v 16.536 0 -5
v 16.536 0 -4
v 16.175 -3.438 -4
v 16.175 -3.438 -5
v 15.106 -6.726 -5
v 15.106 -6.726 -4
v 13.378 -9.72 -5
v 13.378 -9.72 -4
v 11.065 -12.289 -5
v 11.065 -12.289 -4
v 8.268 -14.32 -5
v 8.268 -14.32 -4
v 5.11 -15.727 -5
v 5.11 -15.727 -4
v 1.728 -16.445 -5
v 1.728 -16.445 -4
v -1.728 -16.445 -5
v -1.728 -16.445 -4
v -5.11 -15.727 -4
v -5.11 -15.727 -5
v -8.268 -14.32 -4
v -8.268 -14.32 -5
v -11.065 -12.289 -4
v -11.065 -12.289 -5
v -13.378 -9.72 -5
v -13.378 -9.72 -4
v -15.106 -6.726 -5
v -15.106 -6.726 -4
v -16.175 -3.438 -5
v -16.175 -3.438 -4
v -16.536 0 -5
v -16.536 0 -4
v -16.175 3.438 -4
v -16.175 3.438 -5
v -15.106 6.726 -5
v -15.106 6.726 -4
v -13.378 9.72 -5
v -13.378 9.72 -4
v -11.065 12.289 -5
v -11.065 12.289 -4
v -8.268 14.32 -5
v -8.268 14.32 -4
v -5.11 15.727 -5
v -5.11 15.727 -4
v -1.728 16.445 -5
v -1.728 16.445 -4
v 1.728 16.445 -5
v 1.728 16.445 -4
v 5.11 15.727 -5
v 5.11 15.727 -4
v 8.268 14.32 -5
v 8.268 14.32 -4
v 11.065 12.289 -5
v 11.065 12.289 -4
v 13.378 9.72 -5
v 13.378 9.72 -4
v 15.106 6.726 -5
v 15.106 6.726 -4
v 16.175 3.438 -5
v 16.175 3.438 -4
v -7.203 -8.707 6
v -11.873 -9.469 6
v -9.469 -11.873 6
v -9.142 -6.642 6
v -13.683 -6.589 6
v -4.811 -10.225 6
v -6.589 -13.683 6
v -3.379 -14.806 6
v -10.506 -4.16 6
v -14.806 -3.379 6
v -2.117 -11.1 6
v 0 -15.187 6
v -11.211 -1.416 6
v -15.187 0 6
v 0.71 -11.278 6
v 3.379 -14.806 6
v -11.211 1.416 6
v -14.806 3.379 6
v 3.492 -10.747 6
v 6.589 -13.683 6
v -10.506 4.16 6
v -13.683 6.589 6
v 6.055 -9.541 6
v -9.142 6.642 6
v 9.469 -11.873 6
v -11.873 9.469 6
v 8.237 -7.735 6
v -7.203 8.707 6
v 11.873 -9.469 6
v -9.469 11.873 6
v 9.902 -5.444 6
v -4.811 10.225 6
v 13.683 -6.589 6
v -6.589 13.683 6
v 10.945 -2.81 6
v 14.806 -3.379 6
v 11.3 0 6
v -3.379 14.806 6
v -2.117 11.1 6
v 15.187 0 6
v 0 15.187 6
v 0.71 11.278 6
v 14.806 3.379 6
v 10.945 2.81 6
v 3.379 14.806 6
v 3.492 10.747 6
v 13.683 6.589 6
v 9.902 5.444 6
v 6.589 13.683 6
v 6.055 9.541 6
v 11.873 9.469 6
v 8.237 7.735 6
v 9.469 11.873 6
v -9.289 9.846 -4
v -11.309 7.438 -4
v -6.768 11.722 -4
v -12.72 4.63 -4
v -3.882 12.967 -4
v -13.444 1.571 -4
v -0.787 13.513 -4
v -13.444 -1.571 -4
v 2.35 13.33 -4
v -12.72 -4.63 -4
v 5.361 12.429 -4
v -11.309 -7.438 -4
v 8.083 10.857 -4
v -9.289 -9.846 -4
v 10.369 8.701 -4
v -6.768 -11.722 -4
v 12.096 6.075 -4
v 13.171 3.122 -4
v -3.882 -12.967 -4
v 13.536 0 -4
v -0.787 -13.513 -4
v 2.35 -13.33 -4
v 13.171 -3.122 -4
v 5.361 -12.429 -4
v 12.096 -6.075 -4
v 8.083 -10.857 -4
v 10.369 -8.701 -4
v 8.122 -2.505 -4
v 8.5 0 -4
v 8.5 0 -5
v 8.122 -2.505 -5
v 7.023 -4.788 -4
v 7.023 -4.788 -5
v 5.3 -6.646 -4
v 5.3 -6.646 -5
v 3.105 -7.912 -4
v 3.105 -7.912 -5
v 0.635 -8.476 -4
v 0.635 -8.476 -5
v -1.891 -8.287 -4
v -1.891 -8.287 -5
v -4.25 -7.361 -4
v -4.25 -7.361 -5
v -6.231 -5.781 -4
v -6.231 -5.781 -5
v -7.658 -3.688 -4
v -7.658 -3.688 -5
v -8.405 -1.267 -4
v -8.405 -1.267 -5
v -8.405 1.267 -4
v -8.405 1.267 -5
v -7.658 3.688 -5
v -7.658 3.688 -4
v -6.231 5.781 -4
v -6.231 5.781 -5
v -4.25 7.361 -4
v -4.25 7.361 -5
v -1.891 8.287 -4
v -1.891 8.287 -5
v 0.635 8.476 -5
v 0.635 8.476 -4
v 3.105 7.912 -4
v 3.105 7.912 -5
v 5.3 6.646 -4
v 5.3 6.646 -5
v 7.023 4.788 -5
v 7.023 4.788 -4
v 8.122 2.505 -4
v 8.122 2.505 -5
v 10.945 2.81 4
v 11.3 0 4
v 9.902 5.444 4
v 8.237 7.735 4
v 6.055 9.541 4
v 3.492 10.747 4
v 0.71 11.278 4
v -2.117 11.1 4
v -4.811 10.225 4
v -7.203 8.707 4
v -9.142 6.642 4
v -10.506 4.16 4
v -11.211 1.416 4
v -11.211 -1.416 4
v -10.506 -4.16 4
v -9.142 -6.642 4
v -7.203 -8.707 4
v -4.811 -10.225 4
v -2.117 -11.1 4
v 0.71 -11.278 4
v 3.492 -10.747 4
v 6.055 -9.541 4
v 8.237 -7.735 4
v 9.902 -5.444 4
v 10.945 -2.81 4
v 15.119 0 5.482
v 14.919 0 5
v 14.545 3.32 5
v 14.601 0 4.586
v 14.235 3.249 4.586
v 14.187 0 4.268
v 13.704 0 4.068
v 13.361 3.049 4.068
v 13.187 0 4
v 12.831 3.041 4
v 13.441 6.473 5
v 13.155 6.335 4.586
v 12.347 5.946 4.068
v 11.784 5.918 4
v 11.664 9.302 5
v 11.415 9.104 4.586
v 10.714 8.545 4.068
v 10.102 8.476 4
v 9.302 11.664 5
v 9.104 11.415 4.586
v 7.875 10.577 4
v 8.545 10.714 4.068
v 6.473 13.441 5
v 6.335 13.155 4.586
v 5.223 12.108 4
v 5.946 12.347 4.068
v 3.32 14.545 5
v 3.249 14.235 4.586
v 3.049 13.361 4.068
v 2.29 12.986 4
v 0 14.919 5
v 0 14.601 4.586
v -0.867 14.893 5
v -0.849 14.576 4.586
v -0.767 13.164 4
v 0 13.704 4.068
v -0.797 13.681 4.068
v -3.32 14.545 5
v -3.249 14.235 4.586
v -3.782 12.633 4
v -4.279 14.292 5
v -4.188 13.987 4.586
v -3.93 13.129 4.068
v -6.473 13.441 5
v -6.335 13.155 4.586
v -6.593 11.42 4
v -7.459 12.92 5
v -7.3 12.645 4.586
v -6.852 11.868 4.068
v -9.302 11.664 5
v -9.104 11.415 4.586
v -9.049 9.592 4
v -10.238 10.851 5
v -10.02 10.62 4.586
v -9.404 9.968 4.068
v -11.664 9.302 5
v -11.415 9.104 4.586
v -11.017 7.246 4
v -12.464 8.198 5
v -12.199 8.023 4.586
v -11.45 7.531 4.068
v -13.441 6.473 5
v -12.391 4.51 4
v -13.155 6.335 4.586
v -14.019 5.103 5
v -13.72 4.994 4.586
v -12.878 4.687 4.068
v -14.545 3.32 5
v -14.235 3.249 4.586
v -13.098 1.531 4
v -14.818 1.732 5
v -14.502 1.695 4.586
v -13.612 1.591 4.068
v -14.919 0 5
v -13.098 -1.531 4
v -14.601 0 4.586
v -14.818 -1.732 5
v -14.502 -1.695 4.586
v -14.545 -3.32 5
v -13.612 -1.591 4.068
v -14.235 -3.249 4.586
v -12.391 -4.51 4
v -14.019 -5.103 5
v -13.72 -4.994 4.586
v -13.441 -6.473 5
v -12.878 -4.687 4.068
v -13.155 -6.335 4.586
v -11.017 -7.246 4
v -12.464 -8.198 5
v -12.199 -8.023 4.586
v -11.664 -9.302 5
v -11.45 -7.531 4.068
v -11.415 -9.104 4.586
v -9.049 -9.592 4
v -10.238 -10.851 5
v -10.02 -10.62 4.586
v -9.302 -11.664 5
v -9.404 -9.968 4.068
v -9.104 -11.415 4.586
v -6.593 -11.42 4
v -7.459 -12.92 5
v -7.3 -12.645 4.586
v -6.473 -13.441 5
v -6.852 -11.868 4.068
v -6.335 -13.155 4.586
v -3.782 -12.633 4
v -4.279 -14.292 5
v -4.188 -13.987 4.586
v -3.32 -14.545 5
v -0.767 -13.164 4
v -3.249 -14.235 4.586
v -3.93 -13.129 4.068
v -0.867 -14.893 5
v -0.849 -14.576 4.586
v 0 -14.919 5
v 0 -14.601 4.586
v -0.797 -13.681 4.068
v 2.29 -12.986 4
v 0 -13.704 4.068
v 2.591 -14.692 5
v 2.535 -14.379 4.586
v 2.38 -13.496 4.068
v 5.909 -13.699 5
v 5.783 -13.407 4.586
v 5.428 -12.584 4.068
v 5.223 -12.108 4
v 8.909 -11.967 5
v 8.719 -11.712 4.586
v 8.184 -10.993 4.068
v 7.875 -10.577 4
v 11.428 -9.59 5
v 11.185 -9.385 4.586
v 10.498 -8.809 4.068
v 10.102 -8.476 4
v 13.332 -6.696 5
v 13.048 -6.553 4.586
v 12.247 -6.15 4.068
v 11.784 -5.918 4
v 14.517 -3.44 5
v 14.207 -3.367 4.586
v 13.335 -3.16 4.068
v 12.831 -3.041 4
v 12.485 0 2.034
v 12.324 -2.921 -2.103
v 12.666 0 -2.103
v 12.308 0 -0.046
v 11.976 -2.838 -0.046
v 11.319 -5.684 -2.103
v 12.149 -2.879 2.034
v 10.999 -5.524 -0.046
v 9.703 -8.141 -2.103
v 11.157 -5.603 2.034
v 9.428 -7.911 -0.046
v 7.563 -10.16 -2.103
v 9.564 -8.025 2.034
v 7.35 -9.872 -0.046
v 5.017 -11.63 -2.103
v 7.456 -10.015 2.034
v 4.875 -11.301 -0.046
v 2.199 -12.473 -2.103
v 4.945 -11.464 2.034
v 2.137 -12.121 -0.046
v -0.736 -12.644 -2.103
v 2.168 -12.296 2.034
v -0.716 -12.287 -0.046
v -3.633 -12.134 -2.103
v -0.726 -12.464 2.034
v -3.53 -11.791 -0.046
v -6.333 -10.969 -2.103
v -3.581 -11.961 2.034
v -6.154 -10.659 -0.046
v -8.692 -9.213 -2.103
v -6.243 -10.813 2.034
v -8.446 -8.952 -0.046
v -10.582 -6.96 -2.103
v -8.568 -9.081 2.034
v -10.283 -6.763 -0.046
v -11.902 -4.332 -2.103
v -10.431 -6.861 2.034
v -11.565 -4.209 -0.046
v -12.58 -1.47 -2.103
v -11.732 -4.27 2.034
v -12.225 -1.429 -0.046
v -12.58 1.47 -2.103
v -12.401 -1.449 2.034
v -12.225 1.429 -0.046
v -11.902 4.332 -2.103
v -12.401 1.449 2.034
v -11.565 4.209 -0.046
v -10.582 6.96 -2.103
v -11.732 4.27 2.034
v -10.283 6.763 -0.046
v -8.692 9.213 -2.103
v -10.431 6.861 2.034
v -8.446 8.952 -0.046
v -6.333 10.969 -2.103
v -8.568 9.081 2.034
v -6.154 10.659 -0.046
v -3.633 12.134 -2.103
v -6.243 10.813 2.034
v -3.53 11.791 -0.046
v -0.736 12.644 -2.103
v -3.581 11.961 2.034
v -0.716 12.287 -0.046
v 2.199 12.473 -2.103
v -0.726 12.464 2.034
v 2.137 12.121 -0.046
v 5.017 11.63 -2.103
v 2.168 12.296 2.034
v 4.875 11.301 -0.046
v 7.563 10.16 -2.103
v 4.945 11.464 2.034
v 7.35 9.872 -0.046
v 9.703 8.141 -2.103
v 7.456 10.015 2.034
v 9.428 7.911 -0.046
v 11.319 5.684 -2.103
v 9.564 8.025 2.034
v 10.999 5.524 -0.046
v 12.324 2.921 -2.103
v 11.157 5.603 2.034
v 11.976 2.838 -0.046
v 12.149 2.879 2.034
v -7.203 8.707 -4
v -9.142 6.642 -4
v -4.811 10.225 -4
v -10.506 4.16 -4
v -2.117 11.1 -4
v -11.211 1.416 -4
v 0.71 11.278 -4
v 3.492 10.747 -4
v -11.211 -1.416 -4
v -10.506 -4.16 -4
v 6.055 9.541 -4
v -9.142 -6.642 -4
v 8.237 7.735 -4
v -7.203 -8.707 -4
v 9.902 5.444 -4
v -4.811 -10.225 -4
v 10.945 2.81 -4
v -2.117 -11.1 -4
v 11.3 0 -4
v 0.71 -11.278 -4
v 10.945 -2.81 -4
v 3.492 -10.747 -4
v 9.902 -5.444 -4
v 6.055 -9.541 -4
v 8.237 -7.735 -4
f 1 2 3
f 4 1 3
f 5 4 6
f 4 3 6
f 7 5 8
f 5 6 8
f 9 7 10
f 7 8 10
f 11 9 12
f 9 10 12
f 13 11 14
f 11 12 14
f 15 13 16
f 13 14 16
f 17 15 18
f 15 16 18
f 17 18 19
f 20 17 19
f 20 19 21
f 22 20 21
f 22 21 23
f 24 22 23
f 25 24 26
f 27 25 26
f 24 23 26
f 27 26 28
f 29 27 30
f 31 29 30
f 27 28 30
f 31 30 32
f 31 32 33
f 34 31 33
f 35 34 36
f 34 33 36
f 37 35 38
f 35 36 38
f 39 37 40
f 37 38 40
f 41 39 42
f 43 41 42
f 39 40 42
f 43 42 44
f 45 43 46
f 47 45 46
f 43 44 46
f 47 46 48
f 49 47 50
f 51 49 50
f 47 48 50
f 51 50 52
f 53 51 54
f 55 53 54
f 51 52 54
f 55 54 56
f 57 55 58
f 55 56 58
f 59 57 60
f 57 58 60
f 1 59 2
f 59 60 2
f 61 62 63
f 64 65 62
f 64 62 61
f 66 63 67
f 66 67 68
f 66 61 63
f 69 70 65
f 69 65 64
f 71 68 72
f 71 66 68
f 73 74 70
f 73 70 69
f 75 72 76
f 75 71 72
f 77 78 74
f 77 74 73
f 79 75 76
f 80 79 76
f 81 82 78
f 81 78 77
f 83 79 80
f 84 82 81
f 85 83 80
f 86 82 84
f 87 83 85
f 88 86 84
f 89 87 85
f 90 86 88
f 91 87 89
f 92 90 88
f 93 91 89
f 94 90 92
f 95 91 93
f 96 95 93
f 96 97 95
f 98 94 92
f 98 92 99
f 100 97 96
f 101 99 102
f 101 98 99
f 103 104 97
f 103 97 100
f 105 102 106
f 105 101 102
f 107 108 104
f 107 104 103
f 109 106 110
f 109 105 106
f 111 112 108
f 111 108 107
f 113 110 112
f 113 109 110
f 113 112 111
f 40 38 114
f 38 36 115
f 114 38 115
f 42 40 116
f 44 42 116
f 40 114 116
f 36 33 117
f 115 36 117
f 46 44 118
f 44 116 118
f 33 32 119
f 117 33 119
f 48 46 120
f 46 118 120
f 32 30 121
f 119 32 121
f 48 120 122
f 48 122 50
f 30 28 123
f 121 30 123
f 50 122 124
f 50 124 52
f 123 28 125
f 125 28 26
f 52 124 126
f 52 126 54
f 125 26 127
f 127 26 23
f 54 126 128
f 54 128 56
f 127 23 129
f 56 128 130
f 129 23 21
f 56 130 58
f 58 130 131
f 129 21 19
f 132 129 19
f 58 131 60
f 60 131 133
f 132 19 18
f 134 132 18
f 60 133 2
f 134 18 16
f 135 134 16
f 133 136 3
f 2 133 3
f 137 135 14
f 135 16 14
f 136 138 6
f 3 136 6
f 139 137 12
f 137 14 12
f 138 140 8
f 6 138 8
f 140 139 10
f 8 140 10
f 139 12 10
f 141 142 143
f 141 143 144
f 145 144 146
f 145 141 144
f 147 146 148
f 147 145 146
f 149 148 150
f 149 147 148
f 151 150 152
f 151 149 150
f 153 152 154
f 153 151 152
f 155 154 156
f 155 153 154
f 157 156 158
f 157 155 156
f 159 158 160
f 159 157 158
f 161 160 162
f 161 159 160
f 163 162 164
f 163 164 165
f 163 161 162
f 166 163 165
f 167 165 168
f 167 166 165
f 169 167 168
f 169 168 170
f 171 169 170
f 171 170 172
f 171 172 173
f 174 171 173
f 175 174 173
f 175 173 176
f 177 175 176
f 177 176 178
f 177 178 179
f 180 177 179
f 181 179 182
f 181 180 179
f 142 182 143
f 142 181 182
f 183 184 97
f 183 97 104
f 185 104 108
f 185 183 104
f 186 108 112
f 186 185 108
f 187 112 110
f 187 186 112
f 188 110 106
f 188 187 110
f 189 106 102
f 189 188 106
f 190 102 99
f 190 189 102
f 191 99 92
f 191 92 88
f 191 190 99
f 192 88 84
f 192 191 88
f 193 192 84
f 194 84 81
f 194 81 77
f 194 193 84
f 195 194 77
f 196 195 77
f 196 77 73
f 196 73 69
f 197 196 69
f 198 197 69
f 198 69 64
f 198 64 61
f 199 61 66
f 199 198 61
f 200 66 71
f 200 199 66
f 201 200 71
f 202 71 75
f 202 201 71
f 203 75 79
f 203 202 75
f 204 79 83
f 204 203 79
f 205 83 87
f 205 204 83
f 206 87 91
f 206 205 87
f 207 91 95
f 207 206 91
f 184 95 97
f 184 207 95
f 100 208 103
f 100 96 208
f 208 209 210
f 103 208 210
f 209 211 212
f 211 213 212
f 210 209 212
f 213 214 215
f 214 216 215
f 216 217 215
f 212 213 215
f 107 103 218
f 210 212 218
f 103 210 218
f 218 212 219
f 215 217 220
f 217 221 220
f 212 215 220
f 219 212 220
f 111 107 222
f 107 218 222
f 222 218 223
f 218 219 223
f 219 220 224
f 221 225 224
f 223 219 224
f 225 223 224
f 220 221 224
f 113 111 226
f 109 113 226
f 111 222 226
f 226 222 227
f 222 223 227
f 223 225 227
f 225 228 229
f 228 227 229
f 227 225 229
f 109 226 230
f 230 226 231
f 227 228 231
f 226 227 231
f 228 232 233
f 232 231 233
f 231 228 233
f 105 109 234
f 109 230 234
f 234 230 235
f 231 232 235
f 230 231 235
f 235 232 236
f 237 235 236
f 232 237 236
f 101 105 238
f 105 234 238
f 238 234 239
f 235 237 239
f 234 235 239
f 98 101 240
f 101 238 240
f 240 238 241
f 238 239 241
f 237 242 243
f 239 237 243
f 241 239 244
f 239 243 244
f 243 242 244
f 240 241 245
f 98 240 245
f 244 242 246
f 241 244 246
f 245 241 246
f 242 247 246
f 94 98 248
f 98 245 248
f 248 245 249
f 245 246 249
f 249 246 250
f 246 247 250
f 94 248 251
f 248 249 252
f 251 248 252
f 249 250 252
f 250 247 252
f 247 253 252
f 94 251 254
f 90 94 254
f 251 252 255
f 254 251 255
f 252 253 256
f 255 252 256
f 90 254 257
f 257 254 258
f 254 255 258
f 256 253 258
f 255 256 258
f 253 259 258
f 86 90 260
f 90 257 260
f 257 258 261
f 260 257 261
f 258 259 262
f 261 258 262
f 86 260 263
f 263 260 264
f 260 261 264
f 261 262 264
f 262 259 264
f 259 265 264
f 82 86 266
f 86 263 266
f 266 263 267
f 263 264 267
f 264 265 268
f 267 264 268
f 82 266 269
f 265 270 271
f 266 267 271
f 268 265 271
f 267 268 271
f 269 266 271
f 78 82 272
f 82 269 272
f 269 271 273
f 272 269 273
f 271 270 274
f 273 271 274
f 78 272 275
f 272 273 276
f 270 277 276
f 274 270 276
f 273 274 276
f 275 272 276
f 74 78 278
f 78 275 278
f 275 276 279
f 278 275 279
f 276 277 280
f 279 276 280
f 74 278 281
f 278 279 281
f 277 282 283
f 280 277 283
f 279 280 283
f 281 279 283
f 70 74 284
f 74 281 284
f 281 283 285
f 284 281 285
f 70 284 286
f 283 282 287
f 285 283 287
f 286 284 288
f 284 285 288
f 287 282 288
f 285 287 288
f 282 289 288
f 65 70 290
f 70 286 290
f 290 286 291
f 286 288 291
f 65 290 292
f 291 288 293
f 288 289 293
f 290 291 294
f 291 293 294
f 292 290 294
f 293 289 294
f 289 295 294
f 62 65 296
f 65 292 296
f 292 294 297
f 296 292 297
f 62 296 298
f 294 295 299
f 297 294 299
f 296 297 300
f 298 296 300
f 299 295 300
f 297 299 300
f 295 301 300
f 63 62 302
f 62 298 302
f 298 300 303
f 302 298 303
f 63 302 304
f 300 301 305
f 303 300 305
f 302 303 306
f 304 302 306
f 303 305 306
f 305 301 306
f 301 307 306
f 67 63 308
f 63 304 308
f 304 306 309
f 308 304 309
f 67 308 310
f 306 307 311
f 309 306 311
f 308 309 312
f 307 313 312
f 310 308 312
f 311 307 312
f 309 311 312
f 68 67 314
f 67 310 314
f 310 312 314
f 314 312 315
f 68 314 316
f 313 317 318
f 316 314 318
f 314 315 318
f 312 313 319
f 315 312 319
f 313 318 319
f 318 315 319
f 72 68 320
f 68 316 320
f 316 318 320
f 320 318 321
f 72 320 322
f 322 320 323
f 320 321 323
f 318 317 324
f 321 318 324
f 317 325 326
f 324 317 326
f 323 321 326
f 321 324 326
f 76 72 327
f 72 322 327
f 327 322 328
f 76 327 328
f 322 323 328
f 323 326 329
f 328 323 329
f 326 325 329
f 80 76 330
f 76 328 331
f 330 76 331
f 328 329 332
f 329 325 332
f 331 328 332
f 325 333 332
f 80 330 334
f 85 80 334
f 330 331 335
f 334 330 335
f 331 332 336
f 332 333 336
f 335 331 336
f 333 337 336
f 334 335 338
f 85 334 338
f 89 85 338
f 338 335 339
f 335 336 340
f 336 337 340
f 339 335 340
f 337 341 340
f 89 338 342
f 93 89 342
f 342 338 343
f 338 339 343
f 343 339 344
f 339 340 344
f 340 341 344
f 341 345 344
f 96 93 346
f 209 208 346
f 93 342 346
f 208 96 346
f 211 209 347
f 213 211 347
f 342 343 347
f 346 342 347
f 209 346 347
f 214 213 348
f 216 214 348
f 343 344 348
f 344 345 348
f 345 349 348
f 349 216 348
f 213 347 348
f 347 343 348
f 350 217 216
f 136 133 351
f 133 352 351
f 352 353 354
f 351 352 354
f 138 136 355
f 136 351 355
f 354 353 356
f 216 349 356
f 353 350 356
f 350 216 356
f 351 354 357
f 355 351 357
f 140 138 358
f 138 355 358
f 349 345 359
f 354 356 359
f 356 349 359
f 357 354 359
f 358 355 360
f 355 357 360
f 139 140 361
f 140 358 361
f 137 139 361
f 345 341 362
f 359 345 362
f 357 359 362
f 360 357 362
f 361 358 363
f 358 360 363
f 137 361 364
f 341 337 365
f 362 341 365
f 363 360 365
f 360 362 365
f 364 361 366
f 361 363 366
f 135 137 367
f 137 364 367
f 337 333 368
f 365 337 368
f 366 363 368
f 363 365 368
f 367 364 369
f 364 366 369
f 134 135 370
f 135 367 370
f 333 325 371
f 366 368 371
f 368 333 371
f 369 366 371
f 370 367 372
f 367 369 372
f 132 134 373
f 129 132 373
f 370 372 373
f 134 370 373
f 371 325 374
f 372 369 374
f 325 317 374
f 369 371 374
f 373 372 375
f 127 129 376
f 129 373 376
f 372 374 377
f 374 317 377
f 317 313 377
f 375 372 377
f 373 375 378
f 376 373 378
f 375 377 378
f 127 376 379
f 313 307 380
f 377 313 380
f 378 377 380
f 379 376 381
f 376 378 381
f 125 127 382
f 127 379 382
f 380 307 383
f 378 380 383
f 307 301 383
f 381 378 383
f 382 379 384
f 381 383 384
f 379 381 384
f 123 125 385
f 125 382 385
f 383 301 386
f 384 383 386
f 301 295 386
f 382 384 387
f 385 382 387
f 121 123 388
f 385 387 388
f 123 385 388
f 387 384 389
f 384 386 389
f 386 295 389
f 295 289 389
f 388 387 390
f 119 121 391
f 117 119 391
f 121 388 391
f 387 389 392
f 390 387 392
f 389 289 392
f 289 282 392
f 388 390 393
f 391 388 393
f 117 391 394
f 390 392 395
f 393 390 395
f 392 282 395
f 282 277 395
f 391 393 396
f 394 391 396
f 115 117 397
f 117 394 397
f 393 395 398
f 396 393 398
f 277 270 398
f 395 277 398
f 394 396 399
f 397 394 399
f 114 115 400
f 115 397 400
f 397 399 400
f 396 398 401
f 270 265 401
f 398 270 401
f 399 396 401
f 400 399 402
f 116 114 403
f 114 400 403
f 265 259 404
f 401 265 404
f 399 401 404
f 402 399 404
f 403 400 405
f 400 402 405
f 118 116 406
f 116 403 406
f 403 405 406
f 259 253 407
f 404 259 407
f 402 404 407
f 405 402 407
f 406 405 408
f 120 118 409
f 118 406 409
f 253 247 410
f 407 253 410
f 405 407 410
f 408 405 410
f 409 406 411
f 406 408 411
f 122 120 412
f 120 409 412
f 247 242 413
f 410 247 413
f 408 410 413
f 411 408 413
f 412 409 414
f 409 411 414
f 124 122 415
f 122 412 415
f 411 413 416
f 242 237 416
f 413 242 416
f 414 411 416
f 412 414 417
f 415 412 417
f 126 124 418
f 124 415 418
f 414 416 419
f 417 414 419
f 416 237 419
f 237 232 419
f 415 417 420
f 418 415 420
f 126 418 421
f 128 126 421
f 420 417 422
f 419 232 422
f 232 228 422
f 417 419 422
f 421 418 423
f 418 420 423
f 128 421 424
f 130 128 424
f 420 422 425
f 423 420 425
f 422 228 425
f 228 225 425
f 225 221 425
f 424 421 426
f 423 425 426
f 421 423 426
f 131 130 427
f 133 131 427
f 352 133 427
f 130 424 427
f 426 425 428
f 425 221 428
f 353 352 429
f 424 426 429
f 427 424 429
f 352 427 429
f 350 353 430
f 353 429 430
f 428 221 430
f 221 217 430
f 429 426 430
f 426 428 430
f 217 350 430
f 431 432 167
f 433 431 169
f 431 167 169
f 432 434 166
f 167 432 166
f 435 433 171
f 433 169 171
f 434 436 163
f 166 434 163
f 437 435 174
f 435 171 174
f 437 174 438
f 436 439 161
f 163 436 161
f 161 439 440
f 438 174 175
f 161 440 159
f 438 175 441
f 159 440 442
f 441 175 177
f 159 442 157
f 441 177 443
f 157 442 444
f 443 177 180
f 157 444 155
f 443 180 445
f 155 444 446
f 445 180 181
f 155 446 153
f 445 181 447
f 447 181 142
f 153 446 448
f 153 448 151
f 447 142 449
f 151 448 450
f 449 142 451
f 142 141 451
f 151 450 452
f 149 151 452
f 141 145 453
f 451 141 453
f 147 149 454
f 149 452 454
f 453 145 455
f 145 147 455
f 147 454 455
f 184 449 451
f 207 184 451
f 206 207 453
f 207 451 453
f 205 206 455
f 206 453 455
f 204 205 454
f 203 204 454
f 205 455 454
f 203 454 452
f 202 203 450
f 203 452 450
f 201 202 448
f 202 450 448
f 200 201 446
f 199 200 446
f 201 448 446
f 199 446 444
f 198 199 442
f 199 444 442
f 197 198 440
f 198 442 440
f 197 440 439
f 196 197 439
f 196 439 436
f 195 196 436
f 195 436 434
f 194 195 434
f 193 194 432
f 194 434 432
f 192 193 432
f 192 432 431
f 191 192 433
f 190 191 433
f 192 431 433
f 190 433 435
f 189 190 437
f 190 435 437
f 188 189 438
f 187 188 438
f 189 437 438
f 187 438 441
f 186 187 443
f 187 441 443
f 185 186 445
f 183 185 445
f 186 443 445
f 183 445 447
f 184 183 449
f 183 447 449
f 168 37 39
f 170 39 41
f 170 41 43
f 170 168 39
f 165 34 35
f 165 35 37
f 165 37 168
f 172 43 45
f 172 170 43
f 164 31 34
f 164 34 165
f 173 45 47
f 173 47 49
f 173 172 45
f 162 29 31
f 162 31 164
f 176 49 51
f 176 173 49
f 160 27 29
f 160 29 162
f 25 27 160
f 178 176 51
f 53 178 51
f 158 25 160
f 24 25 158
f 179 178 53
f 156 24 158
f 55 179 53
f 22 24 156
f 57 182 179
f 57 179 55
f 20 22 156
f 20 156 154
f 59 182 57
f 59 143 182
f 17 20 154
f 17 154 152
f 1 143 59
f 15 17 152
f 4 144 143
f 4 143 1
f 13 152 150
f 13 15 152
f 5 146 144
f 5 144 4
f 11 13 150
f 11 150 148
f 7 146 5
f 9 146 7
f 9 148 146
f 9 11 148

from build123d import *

# Parameters (mm, degrees)
F2_R     = 16.5358805208
F2_R_2   = 8.5
F3_DEPTH = 1
F4_R     = 15.1866700875
F4_R_2   = 11.3
F5_DEPTH = 2
F6_R     = 1.99999


# Not quite as in the source:
# - a fillet or chamfer is up to 0.001 mm smaller than in the source, because OpenCascade refuses the exact size


with BuildPart() as f1:
    # F0 (on Front) → F1 (revolve)
    with BuildSketch(Plane.XZ):
        with BuildLine():
            ThreePointArc((13.5358805208, -4), (12.3077325791, -0.0459885139), (13.1866700875, 4))
            Line((13.1866700875, 4), (11.3, 4))
            Line((11.3, 4), (11.3, -4))
            Line((11.3, -4), (13.5358805208, -4))
        make_face()
    revolve(axis=Axis((0, 0, -1.1675134301), (0, 0, -1)))

    # F2 (on face) → F3 (join)
    with BuildSketch(Plane(origin=(0, 0, -4), x_dir=(1, 0, 0), z_dir=(0, 0, -1))):
        Circle(F2_R)
        Circle(F2_R_2, mode=Mode.SUBTRACT)
    extrude(amount=F3_DEPTH)

    # F4 (on face) → F5 (join)
    with BuildSketch(Plane.XY.offset(4)):
        Circle(F4_R)
        Circle(F4_R_2, mode=Mode.SUBTRACT)
    extrude(amount=F5_DEPTH)

    # F6 (radius 2 in the source; OpenCascade refuses exactly that, so slightly less here)
    f6_edges = [f1.edges().sort_by_distance(p)[0] for p in [
        (-15.18667, 0, 4),
    ]]
    fillet(f6_edges, radius=F6_R)


solid = f1.part
